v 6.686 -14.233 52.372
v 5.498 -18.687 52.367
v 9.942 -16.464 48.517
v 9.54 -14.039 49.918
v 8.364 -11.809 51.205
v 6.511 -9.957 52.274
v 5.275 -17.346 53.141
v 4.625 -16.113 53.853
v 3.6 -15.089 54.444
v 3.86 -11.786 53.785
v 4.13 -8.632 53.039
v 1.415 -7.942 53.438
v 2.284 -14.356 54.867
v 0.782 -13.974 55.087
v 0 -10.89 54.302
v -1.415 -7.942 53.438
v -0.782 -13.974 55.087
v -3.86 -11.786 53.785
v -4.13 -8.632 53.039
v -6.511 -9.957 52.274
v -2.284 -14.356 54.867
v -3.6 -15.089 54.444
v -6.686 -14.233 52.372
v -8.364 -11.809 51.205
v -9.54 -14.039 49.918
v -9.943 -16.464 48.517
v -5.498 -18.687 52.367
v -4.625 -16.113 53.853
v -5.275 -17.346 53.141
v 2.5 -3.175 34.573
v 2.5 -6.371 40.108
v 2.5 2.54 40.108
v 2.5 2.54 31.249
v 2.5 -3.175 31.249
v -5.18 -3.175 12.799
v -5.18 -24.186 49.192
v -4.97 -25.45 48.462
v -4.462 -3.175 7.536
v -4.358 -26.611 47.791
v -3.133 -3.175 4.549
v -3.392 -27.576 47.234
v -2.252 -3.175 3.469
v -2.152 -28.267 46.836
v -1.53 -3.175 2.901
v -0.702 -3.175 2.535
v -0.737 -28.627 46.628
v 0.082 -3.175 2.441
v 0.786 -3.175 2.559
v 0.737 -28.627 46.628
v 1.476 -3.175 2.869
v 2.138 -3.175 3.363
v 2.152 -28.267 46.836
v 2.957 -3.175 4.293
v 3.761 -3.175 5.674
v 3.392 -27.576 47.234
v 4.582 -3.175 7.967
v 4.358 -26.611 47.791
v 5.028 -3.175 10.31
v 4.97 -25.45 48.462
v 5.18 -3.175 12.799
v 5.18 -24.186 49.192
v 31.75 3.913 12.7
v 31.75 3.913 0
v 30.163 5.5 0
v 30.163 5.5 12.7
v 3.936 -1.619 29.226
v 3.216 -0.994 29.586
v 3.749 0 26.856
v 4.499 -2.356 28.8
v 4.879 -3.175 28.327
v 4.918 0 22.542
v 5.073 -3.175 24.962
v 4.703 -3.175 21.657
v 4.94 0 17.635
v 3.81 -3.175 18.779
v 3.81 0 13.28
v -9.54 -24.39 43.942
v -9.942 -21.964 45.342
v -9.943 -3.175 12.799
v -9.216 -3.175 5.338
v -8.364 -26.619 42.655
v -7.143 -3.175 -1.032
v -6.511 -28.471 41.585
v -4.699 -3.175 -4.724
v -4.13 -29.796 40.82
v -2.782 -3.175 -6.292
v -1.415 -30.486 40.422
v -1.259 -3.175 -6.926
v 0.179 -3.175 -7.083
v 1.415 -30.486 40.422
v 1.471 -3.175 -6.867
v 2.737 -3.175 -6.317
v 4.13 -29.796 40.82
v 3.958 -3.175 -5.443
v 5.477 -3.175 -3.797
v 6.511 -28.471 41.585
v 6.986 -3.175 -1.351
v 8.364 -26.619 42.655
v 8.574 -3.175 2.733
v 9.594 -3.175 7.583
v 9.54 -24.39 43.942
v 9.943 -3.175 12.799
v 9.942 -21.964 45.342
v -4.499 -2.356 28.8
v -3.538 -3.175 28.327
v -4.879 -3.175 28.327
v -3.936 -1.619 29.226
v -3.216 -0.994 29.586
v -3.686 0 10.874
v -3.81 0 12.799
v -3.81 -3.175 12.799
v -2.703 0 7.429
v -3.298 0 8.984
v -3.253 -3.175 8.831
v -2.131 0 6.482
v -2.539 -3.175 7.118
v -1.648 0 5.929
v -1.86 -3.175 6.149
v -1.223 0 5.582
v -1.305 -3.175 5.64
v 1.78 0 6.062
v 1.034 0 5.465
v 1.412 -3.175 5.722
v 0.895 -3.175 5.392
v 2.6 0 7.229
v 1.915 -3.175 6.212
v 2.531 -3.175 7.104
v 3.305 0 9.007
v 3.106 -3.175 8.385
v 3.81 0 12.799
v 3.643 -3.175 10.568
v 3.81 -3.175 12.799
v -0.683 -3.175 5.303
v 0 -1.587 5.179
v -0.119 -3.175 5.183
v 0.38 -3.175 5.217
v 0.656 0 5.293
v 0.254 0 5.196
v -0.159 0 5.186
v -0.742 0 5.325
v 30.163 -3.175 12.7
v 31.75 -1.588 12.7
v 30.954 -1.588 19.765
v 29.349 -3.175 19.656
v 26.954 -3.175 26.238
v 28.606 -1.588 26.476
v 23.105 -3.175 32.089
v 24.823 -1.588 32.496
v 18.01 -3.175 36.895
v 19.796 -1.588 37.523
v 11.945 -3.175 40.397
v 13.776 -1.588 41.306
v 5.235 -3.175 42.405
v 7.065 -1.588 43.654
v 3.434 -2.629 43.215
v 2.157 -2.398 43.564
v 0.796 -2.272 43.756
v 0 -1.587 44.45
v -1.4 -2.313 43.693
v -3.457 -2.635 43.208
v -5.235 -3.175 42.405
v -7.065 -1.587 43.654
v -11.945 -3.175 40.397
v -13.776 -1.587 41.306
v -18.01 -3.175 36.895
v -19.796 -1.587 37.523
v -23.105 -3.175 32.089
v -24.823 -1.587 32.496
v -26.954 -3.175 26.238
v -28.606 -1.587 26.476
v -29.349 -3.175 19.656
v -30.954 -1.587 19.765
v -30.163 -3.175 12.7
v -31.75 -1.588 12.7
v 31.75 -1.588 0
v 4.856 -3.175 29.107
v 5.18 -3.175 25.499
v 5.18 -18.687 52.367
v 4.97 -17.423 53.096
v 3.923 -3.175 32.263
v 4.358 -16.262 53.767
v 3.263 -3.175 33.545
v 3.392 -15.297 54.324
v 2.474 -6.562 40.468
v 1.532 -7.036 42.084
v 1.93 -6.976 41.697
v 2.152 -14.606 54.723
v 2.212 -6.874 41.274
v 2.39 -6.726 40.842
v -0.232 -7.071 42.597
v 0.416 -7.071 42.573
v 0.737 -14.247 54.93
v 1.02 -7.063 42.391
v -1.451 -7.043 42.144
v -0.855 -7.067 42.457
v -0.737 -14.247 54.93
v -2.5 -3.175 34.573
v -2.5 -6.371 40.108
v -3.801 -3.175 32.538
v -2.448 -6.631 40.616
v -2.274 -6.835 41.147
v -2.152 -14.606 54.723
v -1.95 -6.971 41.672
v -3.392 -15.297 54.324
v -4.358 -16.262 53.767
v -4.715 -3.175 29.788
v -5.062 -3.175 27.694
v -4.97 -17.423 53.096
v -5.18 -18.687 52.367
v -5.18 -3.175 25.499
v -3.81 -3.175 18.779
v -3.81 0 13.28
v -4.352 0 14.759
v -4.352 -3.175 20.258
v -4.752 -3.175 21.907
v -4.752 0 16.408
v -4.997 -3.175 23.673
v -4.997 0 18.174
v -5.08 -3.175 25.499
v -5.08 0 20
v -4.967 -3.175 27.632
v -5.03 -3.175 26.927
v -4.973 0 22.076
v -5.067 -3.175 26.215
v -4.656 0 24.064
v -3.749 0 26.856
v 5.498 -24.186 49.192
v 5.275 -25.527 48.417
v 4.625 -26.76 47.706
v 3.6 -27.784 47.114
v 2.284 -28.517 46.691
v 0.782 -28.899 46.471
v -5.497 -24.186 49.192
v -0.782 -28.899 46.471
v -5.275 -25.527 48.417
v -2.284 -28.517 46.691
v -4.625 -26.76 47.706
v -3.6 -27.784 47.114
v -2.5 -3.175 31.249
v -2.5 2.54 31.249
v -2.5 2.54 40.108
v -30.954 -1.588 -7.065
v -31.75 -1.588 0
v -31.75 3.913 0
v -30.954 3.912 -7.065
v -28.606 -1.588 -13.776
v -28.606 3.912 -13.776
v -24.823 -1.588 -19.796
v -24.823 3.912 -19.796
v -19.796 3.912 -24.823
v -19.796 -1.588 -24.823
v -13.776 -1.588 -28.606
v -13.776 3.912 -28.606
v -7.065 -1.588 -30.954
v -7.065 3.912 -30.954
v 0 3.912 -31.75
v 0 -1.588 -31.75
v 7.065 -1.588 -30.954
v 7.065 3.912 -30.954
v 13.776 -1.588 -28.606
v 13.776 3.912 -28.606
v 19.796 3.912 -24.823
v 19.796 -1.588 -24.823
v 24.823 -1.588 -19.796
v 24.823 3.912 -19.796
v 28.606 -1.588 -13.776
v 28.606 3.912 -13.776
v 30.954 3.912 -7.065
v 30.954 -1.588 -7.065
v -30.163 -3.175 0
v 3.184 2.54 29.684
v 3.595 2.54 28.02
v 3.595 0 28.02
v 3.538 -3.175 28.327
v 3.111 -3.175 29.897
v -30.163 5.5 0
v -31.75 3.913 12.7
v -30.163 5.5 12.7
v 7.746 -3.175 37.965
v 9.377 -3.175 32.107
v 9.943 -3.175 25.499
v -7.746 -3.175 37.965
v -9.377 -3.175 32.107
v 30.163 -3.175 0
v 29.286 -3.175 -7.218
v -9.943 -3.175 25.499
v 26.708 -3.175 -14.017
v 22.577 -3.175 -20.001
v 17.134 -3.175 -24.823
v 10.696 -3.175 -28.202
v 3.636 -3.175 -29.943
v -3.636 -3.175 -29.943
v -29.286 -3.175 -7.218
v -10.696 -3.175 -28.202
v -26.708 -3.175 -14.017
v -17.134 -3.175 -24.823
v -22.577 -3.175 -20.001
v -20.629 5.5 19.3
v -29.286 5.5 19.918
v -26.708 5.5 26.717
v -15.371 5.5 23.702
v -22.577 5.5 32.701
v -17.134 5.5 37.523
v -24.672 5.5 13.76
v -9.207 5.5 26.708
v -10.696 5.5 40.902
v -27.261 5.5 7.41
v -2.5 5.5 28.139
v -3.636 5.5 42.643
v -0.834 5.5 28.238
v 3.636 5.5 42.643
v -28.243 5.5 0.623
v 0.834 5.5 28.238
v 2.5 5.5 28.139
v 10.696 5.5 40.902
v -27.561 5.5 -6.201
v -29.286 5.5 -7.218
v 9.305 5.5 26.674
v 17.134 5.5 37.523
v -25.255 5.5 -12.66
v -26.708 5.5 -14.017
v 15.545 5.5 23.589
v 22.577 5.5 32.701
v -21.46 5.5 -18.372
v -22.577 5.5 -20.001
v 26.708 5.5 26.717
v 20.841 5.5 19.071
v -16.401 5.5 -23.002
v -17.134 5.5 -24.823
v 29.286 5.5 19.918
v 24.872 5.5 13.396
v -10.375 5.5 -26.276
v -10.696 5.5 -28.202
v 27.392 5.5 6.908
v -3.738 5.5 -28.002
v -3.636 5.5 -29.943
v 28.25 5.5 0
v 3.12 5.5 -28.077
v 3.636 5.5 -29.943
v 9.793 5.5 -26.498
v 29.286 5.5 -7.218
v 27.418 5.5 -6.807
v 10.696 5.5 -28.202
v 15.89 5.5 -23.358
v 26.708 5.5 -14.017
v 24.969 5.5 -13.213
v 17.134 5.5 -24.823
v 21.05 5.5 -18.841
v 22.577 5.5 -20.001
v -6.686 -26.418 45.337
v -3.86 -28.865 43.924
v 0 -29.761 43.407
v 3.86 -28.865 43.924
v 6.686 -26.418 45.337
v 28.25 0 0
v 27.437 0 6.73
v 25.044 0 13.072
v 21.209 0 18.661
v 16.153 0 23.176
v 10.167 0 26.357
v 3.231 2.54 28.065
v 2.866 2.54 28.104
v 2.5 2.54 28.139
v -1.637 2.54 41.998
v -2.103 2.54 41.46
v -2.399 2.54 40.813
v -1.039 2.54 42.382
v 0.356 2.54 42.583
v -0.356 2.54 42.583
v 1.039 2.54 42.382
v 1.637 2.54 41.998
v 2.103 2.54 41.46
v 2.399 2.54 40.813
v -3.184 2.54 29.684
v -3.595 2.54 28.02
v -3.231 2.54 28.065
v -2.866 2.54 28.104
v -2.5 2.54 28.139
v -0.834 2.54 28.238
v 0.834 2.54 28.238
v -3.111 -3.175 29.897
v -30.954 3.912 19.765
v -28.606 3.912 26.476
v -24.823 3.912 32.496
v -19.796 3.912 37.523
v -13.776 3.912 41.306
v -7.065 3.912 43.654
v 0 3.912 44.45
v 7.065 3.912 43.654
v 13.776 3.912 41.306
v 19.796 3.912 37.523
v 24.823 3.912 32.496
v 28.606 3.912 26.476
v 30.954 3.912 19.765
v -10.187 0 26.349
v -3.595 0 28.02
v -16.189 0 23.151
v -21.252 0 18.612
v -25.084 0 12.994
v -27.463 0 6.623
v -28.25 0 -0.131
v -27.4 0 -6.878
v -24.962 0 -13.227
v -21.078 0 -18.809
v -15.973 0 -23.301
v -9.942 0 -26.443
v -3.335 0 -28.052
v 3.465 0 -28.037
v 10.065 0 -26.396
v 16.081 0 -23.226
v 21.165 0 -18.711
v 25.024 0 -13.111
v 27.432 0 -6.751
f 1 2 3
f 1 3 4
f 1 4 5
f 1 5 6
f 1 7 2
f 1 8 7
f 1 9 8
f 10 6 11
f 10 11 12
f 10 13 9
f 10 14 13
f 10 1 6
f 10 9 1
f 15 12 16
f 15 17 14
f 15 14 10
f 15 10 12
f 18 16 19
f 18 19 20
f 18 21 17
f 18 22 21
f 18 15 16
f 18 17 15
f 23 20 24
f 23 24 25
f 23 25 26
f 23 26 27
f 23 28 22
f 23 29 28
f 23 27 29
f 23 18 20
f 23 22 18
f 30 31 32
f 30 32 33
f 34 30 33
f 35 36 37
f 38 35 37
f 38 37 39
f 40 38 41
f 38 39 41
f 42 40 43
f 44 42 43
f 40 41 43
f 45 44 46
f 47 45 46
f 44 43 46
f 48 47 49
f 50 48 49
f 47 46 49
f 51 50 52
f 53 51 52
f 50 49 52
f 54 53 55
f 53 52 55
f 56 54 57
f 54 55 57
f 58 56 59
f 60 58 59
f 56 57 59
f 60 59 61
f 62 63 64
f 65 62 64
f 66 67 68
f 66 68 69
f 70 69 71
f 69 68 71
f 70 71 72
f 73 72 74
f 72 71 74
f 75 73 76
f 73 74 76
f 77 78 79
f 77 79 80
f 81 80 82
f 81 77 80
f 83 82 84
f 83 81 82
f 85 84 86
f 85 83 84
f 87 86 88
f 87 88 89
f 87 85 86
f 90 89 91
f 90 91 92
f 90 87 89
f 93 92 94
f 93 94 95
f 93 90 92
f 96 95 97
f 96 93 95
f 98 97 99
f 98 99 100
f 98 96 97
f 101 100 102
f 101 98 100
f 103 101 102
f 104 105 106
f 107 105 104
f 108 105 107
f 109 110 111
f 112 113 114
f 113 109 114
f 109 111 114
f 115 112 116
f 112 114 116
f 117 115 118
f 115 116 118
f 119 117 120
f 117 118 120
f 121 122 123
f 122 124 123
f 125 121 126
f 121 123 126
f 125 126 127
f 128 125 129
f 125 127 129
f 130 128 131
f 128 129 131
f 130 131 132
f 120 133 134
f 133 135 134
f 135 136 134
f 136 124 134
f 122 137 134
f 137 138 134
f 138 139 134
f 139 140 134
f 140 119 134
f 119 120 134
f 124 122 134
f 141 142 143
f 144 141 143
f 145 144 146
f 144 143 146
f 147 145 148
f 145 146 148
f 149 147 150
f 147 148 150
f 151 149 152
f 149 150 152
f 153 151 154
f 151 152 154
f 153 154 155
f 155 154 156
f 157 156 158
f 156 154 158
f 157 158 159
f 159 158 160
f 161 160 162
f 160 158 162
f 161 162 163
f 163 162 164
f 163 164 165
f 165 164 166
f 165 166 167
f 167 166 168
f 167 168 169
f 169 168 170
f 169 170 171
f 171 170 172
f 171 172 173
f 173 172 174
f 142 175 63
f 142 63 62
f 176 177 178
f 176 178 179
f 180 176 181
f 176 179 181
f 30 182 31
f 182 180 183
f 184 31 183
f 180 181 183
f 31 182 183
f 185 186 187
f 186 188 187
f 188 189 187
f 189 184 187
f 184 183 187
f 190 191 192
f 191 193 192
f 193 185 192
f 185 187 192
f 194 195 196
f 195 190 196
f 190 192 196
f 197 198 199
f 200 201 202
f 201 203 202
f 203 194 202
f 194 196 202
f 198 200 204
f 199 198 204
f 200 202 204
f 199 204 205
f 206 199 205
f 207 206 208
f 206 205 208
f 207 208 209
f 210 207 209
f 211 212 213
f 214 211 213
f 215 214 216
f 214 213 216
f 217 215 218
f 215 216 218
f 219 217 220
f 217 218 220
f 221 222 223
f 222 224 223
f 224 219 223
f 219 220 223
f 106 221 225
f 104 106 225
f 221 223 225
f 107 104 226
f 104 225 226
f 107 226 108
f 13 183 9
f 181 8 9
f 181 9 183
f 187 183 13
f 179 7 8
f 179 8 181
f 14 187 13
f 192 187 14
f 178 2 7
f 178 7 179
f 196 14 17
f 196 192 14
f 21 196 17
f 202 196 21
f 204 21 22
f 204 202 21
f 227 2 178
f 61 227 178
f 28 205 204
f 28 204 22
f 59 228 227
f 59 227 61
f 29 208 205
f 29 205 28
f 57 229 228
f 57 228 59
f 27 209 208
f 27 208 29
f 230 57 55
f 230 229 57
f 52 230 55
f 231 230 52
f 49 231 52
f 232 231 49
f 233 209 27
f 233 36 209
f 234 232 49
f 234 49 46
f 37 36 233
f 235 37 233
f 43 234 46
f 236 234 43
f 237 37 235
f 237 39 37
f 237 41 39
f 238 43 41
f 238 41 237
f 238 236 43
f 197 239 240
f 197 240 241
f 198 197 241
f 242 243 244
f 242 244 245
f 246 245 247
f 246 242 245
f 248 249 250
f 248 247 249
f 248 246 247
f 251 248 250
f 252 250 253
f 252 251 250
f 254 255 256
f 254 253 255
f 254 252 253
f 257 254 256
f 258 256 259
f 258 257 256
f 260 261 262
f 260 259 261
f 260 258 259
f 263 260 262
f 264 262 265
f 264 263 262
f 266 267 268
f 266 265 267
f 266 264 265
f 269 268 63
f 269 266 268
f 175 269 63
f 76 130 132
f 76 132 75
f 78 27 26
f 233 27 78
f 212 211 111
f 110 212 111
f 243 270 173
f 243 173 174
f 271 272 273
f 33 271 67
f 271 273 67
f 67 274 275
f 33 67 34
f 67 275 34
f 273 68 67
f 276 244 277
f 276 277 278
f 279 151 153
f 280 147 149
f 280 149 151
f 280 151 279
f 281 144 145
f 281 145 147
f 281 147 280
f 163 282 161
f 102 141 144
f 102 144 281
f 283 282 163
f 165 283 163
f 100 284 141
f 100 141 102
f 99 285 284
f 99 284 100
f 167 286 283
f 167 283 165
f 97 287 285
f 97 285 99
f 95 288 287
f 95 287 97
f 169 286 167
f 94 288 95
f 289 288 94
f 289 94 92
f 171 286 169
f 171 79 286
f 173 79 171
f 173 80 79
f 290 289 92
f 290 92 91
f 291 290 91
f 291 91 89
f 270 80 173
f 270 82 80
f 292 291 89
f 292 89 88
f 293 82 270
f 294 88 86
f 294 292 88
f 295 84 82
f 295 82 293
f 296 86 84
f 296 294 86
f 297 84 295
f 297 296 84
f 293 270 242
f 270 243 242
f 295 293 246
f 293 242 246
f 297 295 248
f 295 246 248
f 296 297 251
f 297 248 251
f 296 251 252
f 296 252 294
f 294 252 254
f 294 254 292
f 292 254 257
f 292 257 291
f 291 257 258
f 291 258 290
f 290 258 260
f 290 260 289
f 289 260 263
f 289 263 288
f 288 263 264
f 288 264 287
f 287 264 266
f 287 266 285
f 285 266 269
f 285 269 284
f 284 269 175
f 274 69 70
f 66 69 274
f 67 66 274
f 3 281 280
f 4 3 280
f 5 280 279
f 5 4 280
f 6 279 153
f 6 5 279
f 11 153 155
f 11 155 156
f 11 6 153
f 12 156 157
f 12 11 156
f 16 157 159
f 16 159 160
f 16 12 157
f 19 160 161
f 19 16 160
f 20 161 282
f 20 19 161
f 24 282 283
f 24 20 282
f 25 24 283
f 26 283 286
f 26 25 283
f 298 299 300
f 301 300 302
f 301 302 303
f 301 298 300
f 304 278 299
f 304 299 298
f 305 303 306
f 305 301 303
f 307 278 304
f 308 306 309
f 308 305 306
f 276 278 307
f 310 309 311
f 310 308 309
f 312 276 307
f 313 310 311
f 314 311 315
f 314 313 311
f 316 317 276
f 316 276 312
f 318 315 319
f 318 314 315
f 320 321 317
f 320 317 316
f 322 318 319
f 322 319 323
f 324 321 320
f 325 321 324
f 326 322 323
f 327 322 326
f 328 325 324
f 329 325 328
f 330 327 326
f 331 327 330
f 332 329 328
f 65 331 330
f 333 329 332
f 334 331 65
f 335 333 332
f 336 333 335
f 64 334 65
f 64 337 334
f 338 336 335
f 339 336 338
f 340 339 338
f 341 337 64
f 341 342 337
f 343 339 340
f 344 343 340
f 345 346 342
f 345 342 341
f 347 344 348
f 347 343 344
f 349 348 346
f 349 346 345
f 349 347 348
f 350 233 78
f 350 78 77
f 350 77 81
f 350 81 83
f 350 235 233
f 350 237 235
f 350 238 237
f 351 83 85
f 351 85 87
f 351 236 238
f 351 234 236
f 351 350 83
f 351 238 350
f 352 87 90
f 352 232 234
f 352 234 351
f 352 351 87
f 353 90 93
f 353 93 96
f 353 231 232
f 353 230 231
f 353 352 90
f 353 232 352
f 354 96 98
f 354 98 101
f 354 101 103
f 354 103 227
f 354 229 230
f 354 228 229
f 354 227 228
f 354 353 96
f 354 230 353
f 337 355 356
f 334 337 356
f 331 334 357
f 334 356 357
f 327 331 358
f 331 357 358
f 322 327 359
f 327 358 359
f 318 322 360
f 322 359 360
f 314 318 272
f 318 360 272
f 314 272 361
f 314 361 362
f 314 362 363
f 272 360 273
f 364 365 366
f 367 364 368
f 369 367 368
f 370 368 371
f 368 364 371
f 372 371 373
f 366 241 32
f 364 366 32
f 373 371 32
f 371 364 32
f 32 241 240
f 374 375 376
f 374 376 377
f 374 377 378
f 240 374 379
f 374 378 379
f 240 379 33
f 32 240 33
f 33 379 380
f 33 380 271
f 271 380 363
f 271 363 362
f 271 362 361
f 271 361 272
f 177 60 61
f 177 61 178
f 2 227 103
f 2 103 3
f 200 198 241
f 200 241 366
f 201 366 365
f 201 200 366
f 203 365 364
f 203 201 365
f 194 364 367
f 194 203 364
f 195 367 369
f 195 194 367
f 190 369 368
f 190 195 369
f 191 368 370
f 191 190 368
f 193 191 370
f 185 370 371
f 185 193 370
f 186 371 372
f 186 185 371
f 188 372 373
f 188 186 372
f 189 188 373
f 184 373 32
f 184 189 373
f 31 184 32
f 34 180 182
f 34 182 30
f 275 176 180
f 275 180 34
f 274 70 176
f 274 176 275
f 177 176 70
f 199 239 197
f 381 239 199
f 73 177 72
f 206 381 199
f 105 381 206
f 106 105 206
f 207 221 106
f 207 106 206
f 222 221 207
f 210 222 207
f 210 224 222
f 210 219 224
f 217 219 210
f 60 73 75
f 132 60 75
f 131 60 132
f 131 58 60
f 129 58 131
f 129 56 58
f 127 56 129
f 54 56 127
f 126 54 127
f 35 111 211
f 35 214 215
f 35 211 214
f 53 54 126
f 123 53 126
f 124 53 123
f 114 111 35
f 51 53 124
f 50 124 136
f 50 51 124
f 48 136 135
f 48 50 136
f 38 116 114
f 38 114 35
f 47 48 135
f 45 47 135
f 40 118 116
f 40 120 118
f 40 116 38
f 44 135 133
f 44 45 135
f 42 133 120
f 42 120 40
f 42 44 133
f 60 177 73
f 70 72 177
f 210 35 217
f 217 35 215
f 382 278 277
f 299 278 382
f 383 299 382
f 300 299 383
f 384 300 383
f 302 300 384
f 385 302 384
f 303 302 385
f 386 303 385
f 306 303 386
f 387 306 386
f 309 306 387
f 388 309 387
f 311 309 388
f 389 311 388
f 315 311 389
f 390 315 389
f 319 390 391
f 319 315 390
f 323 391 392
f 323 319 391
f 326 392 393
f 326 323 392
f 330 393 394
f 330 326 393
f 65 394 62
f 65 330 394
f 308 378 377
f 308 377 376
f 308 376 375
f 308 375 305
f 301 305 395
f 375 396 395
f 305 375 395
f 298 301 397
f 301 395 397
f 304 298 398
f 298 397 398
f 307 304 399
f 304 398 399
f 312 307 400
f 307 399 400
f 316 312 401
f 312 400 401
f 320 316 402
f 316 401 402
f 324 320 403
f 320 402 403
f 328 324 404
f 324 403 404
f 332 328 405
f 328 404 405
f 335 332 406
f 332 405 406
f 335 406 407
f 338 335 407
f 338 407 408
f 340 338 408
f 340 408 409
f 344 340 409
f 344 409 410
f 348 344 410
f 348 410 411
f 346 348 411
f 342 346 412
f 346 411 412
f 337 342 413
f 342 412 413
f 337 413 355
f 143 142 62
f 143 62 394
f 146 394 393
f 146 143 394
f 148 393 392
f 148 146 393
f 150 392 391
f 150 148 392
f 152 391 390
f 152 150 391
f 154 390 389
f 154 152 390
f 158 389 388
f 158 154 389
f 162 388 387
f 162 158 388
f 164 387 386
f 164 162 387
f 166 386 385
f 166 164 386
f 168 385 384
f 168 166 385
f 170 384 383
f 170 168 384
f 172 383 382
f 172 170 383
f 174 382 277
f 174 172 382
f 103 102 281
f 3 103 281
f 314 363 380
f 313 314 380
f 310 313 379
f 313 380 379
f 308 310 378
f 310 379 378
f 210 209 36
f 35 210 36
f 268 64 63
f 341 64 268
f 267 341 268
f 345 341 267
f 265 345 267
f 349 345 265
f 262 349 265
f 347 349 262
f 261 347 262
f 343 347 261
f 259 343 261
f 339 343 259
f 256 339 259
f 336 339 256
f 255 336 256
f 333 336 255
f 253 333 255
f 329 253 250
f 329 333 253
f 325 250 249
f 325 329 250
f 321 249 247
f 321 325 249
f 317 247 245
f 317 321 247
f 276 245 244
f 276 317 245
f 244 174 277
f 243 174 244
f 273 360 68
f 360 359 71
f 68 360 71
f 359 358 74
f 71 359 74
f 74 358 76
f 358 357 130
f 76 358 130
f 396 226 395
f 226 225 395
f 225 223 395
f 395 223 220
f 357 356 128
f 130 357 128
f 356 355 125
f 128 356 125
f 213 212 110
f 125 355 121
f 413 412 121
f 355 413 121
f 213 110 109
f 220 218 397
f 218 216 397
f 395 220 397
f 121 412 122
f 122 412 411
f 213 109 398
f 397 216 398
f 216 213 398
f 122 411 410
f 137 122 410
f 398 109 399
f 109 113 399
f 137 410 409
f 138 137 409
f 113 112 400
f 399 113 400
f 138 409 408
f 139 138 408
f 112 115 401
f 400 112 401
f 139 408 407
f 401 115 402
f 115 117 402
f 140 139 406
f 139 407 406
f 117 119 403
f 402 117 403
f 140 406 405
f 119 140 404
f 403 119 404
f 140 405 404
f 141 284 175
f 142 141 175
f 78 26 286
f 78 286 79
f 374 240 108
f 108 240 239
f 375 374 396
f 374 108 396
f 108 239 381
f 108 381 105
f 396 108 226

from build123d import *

# Parameters (mm, degrees)
BOSS_EXTRUDE1_DEPTH     = 5.5
BOSS_EXTRUDE2_START     = -3.175
BOSS_EXTRUDE2_DEPTH     = 3.175
BOSS_EXTRUDE4_REACH     = 95.106
CUT_EXTRUDE1_DEPTH      = 2.54
CUT_EXTRUDE1_DEPTH_BACK = 12.7
CUT_EXTRUDE2_REACH      = 73.925
SKETCH7_R               = 5.08
CUT_EXTRUDE4_DEPTH      = 19.05
CHAMFER3_SIZE           = 4.445
CHAMFER4_SIZE           = 1.5875


with BuildPart() as part:
    # Sketch1 → Boss-Extrude1 (new body)
    # profile 1 of 2: a face of its own
    with BuildSketch(Plane(origin=(0, 0, 0), x_dir=(1, 0, 0), z_dir=(0, 1, 0))):
        with BuildLine():
            Line((31.75, -12.7), (31.75, 0))
            ThreePointArc((31.75, 0), (0, 31.75), (-31.75, 0))
            Line((-31.75, 0), (-31.75, -12.7))
            ThreePointArc((-31.75, -12.7), (0, -44.45), (31.75, -12.7))
        make_face()
        with BuildLine():
            ThreePointArc((2.5, -40.108217228), (0, -42.608217228), (-2.5, -40.108217228))
            Line((-2.5, -40.108217228), (-2.5, -28.139163101))
            ThreePointArc((-2.5, -28.139163101), (-19.071411851, 20.840915287), (28.25, 0))
            ThreePointArc((28.25, 0), (20.840915287, -19.071411851), (2.5, -28.139163101))
            Line((2.5, -28.139163101), (2.5, -40.108217228))
        make_face(mode=Mode.SUBTRACT)
    # profile 2 of 2: a face of its own
    with BuildSketch(Plane(origin=(0, 0, 0), x_dir=(1, 0, 0), z_dir=(0, 1, 0))):
        with BuildLine():
            Line((-2.5, -28.139163101), (-2.5, -40.108217228))
            ThreePointArc((-2.5, -40.108217228), (0, -42.608217228), (2.5, -40.108217228))
            Line((2.5, -40.108217228), (2.5, -28.139163101))
            ThreePointArc((2.5, -28.139163101), (0, -28.25), (-2.5, -28.139163101))
        make_face()
    extrude(amount=BOSS_EXTRUDE1_DEPTH)

    # Sketch1<3> → Boss-Extrude2 (add)
    with BuildSketch(Plane(origin=(0, 0, 0), x_dir=(1, 0, 0), z_dir=(0, 1, 0)).offset(BOSS_EXTRUDE2_START)):
        with BuildLine():
            Line((31.75, 0), (31.75, -12.7))
            ThreePointArc((31.75, -12.7), (0, -44.45), (-31.75, -12.7))
            Line((-31.75, -12.7), (-31.75, 0))
            ThreePointArc((-31.75, 0), (0, 31.75), (31.75, 0))
        make_face()
    extrude(amount=BOSS_EXTRUDE2_DEPTH)

    # Sketch9 → Boss-Extrude4 (add, up to next)
    with BuildSketch(Plane(origin=(0, -18.686909051, 52.366675913), x_dir=(1, 0, 0), z_dir=(-1.7076979057767106e-15, 0.4999999999999981, -0.8660254037844397)), mode=Mode.PRIVATE) as boss_extrude4_sk1:
        with BuildLine():
            Line((9.9425, 6.35), (9.9425, 0))
            ThreePointArc((9.9425, 0), (0, -9.9425), (-9.9425, 0))
            Line((-9.9425, 0), (-9.9425, 6.35))
            ThreePointArc((-9.9425, 6.35), (0, 16.2925), (9.9425, 6.35))
        make_face()
        with BuildLine():
            Line((5.18, 6.35), (5.18, 0))
            ThreePointArc((5.18, 0), (0, -5.18), (-5.18, 0))
            Line((-5.18, 0), (-5.18, 6.35))
            ThreePointArc((-5.18, 6.35), (0, 11.53), (5.18, 6.35))
        make_face(mode=Mode.SUBTRACT)
    boss_extrude4_tool1 = extrude(boss_extrude4_sk1.sketch, amount=BOSS_EXTRUDE4_REACH, mode=Mode.PRIVATE) - part.part
    add(boss_extrude4_tool1.solids().sort_by_distance((-9.613306, -21.43654, 50.779176))[0])

    # Sketch1<5> → Cut-Extrude1 (cut, two sides: drawn at the far end of the back side and taken through both)
    with BuildSketch(Plane(origin=(0, 0, 0), x_dir=(1, 0, 0), z_dir=(0, 1, 0)).offset(-CUT_EXTRUDE1_DEPTH_BACK)):
        with BuildLine():
            Line((-2.5, -28.139163101), (-2.5, -40.108217228))
            ThreePointArc((-2.5, -40.108217228), (0, -42.608217228), (2.5, -40.108217228))
            Line((2.5, -40.108217228), (2.5, -28.139163101))
            ThreePointArc((2.5, -28.139163101), (0, -28.25), (-2.5, -28.139163101))
        make_face()
    extrude(amount=CUT_EXTRUDE1_DEPTH + CUT_EXTRUDE1_DEPTH_BACK, mode=Mode.SUBTRACT)

    # Cut-Extrude2: up to this face of the body (flat: up to its plane)
    cut_extrude2_end = Plane(part.part.faces().sort_by_distance((0, 2.54, 35.153591808))[0])
    # Sketch6 → Cut-Extrude2 (cut, up to the picked face)
    with BuildSketch(Plane.XZ.offset(3.175), mode=Mode.PRIVATE) as cut_extrude2_sk1:
        with BuildLine():
            Line((3.81, 12.799261314), (3.81, 25.499261314))
            add(Edge.make_bspline(
                [(3.81, 25.499261314), (3.81, 33.119261314), (0, 33.119261314), (-3.81, 33.119261314), (-3.81, 25.499261314)],
                knots=[4.71238898, 4.71238898, 4.71238898, 6.283185307, 6.283185307, 7.853981634, 7.853981634, 7.853981634], degree=2, weights=[1, 0.707106781, 1, 0.707106781, 1]))
            Line((-3.81, 25.499261314), (-3.81, 12.799261314))
            add(Edge.make_bspline(
                [(-3.81, 12.799261314), (-3.81, 5.179261314), (0, 5.179261314), (3.81, 5.179261314), (3.81, 12.799261314)],
                knots=[1.570796327, 1.570796327, 1.570796327, 3.141592654, 3.141592654, 4.71238898, 4.71238898, 4.71238898], degree=2, weights=[1, 0.707106781, 1, 0.707106781, 1]))
        make_face()
    cut_extrude2_tool1 = split(extrude(cut_extrude2_sk1.sketch, amount=-CUT_EXTRUDE2_REACH, mode=Mode.PRIVATE), bisect_by=cut_extrude2_end, keep=Keep.BOTH, mode=Mode.PRIVATE)
    add(cut_extrude2_tool1.solids().sort_by(Axis((0, -3.175, 19.149261), (0, 1, 0)))[0], mode=Mode.SUBTRACT)

    # Sketch7 → Cut-Extrude4 (cut)
    with BuildSketch(Plane(origin=(0, -3.534663089, 6.122216058), x_dir=(-1, 0, 0), z_dir=(-1.5543122344752196e-15, 0.49999999999999956, -0.8660254037844389))):
        with Locations((0, 10)):
            Circle(SKETCH7_R)
    extrude(amount=-CUT_EXTRUDE4_DEPTH, mode=Mode.SUBTRACT)

    # Chamfer3
    chamfer3_edges = [part.edges().sort_by_distance(p)[0] for p in [
        (-9.9425, -21.436539708, 50.779175913),
        (0, -32.796627942, 44.220425913),
        (0, -10.076451474, 57.337925913),
        (9.9425, -21.436539708, 50.779175913),
    ]]
    chamfer(chamfer3_edges, length=CHAMFER3_SIZE)

    # Chamfer4
    # the kernel refuses this chamfer: 1.5875 mm, written as the material it takes off along each edge
    with BuildSketch(Plane(origin=(0, -3.175, 12.7), x_dir=(0.025619349712622985, 0, 0.9996717705928794), z_dir=(0.9996717705928794, 0, -0.025619349712622985))) as chamfer4_piece_1_section:
        Polygon((31.75 - CHAMFER4_SIZE, 0), (31.75, -CHAMFER4_SIZE), (31.75, 0), align=None)
    chamfer4_piece_1 = revolve(axis=Axis((0, -3.175, 12.7), (0, -1, 0)), revolution_arc=91.468041234, mode=Mode.PRIVATE)
    chamfer4_piece_1 = chamfer4_piece_1 - Plane(origin=(0, -7.049278044, 32.20970773), x_dir=(1, 0, 0), z_dir=(1.7076979057767106e-15, -0.4999999999999981, 0.8660254037844397)) * Cylinder(9.9425, 127, mode=Mode.PRIVATE)
    add(chamfer4_piece_1, mode=Mode.SUBTRACT)
    with BuildSketch(Plane(origin=(31.75, -3.175, 0), x_dir=(-0.9996219169112966, -0.02749587661058651, 0), z_dir=(0, 0, 1)), Plane(origin=(-31.75, -3.175, 12.7), x_dir=(0.9996219169112966, -0.02749587661058651, 0), z_dir=(0, 0, -1))) as chamfer4_piece_2:
        Polygon((CHAMFER4_SIZE * 0.999621916911, -CHAMFER4_SIZE * 0.0274958766106), (-CHAMFER4_SIZE * 0.0274958766106, -CHAMFER4_SIZE * 0.999621916911), (0, 0), align=None)
    extrude(amount=12.7, mode=Mode.SUBTRACT)
    with BuildSketch(Plane(origin=(0, -3.175, 0), x_dir=(-1, 0, 0), z_dir=(0, 0, 1))) as chamfer4_piece_3:
        Polygon((31.75 - CHAMFER4_SIZE, 0), (31.75, -CHAMFER4_SIZE), (31.75, 0), align=None)
    revolve(axis=Axis((0, -3.175, 0), (0, -1, 0)), revolution_arc=180, mode=Mode.SUBTRACT)
    with BuildSketch(Plane(origin=(0, 5.5, 0), x_dir=(1, 0, 0), z_dir=(0, 0, 1))) as chamfer4_piece_4:
        Polygon((31.75, -CHAMFER4_SIZE), (31.75 - CHAMFER4_SIZE, 0), (31.75, 0), align=None)
    revolve(axis=Axis((0, 5.5, 0), (0, 1, 0)), revolution_arc=180, mode=Mode.SUBTRACT)
    with BuildSketch(Plane(origin=(-31.75, 5.5, 0), x_dir=(-0.027495876610585654, -0.9996219169112968, 0), z_dir=(0, 0, 1)), Plane(origin=(31.75, 5.5, 12.7), x_dir=(0.027495876610585654, -0.9996219169112968, 0), z_dir=(0, 0, -1))) as chamfer4_piece_5:
        Polygon((CHAMFER4_SIZE * 0.999621916911, CHAMFER4_SIZE * 0.0274958766106), (-CHAMFER4_SIZE * 0.0274958766106, CHAMFER4_SIZE * 0.999621916911), (0, 0), align=None)
    extrude(amount=12.7, mode=Mode.SUBTRACT)
    with BuildSketch(Plane(origin=(0, 5.5, 12.7), x_dir=(-1, 0, 0), z_dir=(0, 0, -1))) as chamfer4_piece_6:
        Polygon((31.75, -CHAMFER4_SIZE), (31.75 - CHAMFER4_SIZE, 0), (31.75, 0), align=None)
    revolve(axis=Axis((0, 5.5, 12.7), (0, 1, 0)), revolution_arc=180, mode=Mode.SUBTRACT)
    with BuildSketch(Plane(origin=(0, -3.175, 12.7), x_dir=(1, 0, 0), z_dir=(0, 0, -1))) as chamfer4_piece_7_section:
        Polygon((31.75 - CHAMFER4_SIZE, 0), (31.75, -CHAMFER4_SIZE), (31.75, 0), align=None)
    chamfer4_piece_7 = revolve(axis=Axis((0, -3.175, 12.7), (0, -1, 0)), revolution_arc=91.468041234, mode=Mode.PRIVATE)
    chamfer4_piece_7 = chamfer4_piece_7 - Plane(origin=(0, -7.049278047, 32.209707734), x_dir=(1, 0, 0), z_dir=(1.7076979057767106e-15, -0.4999999999999981, 0.8660254037844397)) * Cylinder(9.9425, 127, mode=Mode.PRIVATE)
    add(chamfer4_piece_7, mode=Mode.SUBTRACT)


solid = part.part
